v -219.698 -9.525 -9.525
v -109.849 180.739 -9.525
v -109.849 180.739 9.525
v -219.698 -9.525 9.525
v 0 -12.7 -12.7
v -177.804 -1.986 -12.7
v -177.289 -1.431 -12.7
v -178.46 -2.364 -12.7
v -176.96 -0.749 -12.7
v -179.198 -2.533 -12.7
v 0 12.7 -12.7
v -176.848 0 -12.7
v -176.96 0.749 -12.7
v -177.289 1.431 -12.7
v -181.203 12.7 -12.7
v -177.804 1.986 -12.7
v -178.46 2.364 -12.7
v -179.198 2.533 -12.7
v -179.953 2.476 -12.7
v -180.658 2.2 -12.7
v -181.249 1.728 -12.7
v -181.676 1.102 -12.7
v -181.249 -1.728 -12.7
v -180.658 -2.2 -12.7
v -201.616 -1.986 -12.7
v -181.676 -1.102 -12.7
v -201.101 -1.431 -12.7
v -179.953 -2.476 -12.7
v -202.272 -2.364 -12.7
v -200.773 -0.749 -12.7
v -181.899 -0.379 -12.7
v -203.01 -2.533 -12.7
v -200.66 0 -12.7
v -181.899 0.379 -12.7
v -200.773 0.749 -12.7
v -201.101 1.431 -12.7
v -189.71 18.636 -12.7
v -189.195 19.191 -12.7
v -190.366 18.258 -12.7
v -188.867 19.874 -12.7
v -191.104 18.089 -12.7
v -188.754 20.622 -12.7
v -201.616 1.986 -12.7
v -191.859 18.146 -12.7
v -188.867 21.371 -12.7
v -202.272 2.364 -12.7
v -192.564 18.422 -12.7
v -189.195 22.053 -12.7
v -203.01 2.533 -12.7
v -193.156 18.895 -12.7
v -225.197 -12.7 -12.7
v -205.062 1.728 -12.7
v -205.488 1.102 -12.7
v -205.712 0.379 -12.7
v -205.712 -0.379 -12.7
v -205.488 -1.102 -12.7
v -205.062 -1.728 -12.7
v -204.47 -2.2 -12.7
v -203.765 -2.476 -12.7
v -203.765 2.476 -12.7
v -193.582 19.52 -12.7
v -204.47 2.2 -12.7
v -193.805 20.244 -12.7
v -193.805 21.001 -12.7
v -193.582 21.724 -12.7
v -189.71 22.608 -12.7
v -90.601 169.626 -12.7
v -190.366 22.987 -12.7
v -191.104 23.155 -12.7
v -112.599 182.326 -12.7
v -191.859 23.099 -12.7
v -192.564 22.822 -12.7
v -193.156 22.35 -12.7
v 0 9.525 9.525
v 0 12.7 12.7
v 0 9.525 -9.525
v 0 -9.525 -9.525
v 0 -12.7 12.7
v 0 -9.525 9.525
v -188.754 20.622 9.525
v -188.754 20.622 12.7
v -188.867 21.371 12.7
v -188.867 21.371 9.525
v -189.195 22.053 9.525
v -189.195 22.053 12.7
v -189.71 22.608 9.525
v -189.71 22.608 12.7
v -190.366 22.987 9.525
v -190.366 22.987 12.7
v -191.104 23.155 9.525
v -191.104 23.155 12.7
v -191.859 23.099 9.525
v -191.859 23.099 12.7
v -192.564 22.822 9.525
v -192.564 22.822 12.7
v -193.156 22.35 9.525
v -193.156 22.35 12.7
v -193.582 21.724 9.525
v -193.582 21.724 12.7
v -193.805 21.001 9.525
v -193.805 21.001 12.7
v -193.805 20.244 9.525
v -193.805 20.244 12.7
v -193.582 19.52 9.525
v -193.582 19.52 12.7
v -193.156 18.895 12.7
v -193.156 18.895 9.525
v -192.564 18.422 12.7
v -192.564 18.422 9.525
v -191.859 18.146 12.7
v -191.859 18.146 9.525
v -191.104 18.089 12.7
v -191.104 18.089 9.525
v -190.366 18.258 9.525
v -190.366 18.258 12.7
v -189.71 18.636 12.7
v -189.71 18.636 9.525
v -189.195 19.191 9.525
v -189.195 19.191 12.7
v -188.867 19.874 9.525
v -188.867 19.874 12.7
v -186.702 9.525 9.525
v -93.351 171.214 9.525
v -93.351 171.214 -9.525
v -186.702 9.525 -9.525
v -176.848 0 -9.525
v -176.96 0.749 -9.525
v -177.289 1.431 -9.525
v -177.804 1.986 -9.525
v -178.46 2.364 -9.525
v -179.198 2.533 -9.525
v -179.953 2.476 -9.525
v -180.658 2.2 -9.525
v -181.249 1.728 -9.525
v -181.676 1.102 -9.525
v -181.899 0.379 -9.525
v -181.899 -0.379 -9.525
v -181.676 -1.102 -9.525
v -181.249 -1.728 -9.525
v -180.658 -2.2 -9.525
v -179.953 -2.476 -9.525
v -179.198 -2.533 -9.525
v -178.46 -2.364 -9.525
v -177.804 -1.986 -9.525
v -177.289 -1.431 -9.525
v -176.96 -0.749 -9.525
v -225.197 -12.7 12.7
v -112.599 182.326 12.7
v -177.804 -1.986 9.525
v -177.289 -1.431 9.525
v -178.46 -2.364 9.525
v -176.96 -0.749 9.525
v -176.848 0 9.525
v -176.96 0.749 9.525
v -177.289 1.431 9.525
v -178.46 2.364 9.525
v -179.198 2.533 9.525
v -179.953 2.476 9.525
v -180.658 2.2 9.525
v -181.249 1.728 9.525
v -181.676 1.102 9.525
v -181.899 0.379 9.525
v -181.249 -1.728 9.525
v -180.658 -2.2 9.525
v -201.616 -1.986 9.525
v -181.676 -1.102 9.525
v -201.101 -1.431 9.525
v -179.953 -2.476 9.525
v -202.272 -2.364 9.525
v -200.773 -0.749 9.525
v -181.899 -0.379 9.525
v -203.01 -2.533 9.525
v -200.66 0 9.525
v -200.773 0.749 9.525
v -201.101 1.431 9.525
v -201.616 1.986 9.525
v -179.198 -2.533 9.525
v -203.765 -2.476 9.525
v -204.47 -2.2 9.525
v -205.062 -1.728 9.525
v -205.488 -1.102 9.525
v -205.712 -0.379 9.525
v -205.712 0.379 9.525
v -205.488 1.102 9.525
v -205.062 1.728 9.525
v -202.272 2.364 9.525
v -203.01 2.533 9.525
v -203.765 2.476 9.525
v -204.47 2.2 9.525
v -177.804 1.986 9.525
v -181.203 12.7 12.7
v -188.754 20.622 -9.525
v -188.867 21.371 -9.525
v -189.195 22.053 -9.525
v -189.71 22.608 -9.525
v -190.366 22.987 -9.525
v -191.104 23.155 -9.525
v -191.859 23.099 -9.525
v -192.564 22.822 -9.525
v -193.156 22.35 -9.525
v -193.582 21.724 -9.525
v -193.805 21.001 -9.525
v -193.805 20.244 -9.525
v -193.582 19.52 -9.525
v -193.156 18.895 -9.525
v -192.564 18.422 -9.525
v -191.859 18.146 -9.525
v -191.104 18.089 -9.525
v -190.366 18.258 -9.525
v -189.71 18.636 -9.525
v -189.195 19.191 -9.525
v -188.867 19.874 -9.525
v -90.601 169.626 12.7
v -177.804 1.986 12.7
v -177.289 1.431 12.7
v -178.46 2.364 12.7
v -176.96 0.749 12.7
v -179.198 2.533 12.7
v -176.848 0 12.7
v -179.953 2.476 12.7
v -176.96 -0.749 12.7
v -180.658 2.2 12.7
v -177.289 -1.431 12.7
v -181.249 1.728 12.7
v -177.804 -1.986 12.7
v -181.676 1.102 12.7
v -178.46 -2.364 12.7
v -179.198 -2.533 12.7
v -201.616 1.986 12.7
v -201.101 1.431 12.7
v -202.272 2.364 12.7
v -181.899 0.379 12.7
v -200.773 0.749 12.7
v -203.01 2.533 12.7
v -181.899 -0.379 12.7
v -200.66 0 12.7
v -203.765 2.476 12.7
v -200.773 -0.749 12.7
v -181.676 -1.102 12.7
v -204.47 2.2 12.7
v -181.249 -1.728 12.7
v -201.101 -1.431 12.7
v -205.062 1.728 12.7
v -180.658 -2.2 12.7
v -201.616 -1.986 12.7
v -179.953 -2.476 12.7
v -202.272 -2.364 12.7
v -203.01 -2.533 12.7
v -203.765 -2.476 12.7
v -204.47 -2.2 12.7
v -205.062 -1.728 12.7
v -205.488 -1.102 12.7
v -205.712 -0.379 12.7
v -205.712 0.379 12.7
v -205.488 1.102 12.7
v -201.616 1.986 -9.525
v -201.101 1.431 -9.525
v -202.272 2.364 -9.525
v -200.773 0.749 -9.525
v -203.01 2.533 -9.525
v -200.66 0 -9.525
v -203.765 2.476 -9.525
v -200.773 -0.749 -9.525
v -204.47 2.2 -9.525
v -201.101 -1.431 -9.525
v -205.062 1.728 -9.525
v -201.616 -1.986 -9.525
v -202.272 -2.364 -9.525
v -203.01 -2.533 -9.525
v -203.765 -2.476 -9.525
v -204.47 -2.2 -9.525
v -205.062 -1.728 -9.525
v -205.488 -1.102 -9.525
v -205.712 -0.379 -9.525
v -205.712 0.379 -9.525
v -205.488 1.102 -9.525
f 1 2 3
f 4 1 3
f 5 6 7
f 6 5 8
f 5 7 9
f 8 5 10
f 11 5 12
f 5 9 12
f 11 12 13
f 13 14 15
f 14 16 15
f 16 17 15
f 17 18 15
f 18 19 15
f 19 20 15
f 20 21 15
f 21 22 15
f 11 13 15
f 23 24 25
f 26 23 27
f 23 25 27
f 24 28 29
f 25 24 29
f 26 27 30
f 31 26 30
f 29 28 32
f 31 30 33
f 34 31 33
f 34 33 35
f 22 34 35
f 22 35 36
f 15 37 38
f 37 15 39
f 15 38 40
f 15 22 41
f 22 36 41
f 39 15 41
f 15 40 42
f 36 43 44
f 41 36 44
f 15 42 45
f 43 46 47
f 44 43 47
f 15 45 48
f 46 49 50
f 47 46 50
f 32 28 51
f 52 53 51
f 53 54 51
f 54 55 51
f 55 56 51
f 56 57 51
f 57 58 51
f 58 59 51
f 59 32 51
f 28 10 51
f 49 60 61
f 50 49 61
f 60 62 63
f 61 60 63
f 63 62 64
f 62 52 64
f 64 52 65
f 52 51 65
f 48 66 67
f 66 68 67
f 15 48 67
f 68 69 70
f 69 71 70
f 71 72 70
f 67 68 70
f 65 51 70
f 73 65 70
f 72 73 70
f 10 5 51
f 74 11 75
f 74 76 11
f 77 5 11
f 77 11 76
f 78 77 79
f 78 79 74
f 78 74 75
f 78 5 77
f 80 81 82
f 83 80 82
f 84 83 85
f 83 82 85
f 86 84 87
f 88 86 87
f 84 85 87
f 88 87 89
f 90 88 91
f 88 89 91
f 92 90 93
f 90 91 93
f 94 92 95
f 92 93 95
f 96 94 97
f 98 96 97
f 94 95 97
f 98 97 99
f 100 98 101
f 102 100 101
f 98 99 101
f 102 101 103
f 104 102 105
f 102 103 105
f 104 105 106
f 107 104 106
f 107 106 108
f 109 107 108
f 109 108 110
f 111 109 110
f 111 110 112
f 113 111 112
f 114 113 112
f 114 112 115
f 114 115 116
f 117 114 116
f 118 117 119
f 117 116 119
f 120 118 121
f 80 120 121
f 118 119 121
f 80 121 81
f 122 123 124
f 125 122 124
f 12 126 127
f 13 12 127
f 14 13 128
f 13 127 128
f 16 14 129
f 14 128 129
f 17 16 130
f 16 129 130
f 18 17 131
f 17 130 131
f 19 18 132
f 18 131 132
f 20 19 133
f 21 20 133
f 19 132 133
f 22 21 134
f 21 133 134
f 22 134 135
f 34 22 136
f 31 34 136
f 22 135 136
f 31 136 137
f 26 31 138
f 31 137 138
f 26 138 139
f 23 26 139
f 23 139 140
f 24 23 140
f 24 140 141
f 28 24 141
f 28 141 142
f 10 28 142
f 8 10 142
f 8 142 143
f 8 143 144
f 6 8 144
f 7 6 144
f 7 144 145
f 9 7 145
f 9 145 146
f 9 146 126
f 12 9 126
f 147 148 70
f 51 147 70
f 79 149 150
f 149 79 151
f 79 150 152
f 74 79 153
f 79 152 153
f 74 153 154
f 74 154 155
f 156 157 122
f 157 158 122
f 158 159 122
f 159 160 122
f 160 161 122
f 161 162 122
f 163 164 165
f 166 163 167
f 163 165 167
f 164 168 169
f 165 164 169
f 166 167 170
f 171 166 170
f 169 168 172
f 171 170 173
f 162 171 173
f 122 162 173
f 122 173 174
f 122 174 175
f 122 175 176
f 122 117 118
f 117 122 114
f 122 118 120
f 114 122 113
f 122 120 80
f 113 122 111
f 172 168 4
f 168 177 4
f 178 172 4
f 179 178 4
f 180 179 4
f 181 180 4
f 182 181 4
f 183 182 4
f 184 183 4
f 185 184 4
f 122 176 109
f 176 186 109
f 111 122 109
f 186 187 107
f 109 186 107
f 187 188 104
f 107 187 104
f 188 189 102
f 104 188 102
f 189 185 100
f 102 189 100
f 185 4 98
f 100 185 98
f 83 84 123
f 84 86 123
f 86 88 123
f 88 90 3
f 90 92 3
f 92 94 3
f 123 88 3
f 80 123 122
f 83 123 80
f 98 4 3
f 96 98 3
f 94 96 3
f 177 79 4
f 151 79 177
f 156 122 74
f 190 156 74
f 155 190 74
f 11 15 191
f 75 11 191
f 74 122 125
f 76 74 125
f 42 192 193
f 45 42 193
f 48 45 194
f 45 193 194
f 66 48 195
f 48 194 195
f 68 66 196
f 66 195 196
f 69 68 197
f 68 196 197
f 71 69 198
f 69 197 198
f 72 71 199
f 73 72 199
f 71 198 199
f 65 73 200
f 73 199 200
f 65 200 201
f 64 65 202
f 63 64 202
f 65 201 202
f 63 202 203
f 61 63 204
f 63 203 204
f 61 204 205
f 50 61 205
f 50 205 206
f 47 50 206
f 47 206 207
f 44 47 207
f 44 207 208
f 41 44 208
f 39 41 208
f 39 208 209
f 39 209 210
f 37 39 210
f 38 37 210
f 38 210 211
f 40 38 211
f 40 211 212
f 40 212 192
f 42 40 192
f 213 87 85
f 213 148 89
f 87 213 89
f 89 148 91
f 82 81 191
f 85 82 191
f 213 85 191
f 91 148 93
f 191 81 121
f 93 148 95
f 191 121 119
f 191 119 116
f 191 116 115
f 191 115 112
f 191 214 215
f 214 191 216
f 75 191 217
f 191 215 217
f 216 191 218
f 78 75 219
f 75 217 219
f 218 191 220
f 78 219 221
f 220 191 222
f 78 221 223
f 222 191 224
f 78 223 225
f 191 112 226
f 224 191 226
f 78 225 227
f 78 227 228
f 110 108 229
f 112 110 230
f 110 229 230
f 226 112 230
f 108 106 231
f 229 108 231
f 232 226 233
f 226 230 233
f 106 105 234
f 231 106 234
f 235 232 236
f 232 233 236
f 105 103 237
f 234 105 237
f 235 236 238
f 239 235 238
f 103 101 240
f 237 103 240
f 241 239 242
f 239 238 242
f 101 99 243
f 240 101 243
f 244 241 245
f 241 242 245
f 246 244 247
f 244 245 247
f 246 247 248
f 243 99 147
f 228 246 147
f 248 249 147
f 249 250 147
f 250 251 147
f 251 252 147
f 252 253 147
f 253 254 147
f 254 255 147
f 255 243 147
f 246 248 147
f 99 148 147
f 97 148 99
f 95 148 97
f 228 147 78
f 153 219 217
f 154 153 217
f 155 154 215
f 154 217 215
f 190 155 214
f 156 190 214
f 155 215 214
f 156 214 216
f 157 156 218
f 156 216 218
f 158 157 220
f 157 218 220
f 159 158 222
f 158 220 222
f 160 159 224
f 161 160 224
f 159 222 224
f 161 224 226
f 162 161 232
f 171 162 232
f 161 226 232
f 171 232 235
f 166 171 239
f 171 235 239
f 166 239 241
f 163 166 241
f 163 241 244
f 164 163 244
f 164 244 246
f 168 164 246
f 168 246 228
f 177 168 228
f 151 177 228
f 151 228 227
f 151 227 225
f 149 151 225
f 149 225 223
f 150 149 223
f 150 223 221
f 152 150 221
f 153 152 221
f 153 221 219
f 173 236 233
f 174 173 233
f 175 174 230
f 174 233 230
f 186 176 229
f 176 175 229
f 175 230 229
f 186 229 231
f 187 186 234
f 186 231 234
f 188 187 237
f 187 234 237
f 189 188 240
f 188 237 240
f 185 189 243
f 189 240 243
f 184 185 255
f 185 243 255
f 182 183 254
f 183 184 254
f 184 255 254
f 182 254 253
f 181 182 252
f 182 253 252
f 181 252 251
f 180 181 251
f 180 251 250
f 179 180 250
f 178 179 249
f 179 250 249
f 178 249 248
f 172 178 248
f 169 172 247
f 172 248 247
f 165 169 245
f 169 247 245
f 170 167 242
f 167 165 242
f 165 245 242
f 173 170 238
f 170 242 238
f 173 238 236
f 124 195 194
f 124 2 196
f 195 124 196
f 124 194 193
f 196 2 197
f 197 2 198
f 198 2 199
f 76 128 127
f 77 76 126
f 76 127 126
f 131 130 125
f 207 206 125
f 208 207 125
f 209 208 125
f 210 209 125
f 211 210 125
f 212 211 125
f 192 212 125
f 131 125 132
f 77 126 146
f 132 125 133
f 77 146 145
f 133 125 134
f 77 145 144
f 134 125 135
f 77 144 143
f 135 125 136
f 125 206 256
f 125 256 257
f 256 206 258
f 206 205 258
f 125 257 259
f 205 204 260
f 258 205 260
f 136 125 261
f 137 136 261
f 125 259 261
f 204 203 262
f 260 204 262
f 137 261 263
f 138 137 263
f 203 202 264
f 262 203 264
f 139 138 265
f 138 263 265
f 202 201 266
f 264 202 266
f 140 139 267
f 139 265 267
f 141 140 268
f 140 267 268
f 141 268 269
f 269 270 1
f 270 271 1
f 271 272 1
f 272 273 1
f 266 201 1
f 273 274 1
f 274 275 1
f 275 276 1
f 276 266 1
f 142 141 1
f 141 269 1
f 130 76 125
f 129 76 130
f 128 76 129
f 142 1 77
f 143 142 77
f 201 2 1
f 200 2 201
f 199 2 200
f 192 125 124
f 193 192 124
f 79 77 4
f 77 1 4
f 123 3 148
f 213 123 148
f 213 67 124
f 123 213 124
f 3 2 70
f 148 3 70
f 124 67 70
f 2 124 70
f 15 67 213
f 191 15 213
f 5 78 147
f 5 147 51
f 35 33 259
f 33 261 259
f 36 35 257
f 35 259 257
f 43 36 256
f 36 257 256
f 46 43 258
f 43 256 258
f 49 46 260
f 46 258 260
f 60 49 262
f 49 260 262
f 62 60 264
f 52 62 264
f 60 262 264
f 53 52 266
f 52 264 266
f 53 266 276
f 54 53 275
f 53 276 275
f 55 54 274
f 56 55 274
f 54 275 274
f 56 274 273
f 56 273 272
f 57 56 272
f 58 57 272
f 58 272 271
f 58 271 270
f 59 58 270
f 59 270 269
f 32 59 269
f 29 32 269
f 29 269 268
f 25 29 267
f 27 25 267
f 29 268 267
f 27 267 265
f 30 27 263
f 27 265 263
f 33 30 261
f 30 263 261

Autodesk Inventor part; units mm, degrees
ref_plane "YZ Plane" through (0, 0, 0) normal (1, 0, 0) x (0, 1, 0)
ref_plane "XZ Plane" through (0, 0, 0) normal (0, 1, 0) x (-1, 0, 0)
ref_plane "XY Plane" through (0, 0, 0) normal (0, 0, 1) x (1, 0, 0)
sketch "Sketch1" plane through (0, 0, 0) normal (0, 0, 1) x (1, 0, 0)
  line L0 (0, 0) -> (-203.2, 0)
  line L1 (-203.2, 0) -> (-101.6, 175.9764)
  dimension "d0" = 60
  dimension "d1" = 203.2
sketch "Sketch2" plane through (0, 0, 0) normal (1, 0, 0) x (0, 1, 0)
  line L0 (-12.7, 12.7) -> (-12.7, -12.7)
  line L1 (-12.7, -12.7) -> (12.7, -12.7)
  line L2 (12.7, -12.7) -> (12.7, 12.7)
  line L3 (12.7, 12.7) -> (-12.7, 12.7)
  line L4 (-12.7, 12.7) -> (12.7, -12.7) construction
  line L5 (-12.7, -12.7) -> (12.7, 12.7) construction
  line L6 (-9.525, 9.525) -> (-9.525, -9.525)
  line L7 (-9.525, -9.525) -> (9.525, -9.525)
  line L8 (9.525, -9.525) -> (9.525, 9.525)
  line L9 (9.525, 9.525) -> (-9.525, 9.525)
  line L10 (-9.525, 9.525) -> (9.525, -9.525) construction
  line L11 (-9.525, -9.525) -> (9.525, 9.525) construction
  point P0 (0, 0)
  dimension "d2" = 25.4
  dimension "d3" = 3.175
sweep "Sweep1" add profiles "Sketch2" path "Sketch1"
sketch "Sketch3" plane through (0, -12.7, 12.7) normal (0, 0, 1) x (1, 0, 0)
  line L0 (0, 0) -> (-225.197, 0) construction
  line L1 (0, 25.4) -> (-181.203, 25.4) construction
  line L2 (-225.197, 0) -> (-181.203, 25.4) construction
  circle A0 centre (-203.2, 12.7) radius 2.54
  line L3 (-112.5985, 195.0264) -> (-90.6015, 182.3264) construction
  line L4 (-190.0237, 35.5219) -> (-203.2, 12.7) construction
  line L5 (-203.2, 12.7) -> (-176.8475, 12.7) construction
  circle A1 centre (-191.2937, 33.3222) radius 2.54
  circle A2 centre (-179.3875, 12.7) radius 2.54
  point P0 (0, 12.7)
  dimension "d6" = 5.08
  dimension "d10" = 23.8125
extrude "Extrusion1" cut sketch "Sketch3" against normal through all
properties part number "60DegreeAlumTubing"
